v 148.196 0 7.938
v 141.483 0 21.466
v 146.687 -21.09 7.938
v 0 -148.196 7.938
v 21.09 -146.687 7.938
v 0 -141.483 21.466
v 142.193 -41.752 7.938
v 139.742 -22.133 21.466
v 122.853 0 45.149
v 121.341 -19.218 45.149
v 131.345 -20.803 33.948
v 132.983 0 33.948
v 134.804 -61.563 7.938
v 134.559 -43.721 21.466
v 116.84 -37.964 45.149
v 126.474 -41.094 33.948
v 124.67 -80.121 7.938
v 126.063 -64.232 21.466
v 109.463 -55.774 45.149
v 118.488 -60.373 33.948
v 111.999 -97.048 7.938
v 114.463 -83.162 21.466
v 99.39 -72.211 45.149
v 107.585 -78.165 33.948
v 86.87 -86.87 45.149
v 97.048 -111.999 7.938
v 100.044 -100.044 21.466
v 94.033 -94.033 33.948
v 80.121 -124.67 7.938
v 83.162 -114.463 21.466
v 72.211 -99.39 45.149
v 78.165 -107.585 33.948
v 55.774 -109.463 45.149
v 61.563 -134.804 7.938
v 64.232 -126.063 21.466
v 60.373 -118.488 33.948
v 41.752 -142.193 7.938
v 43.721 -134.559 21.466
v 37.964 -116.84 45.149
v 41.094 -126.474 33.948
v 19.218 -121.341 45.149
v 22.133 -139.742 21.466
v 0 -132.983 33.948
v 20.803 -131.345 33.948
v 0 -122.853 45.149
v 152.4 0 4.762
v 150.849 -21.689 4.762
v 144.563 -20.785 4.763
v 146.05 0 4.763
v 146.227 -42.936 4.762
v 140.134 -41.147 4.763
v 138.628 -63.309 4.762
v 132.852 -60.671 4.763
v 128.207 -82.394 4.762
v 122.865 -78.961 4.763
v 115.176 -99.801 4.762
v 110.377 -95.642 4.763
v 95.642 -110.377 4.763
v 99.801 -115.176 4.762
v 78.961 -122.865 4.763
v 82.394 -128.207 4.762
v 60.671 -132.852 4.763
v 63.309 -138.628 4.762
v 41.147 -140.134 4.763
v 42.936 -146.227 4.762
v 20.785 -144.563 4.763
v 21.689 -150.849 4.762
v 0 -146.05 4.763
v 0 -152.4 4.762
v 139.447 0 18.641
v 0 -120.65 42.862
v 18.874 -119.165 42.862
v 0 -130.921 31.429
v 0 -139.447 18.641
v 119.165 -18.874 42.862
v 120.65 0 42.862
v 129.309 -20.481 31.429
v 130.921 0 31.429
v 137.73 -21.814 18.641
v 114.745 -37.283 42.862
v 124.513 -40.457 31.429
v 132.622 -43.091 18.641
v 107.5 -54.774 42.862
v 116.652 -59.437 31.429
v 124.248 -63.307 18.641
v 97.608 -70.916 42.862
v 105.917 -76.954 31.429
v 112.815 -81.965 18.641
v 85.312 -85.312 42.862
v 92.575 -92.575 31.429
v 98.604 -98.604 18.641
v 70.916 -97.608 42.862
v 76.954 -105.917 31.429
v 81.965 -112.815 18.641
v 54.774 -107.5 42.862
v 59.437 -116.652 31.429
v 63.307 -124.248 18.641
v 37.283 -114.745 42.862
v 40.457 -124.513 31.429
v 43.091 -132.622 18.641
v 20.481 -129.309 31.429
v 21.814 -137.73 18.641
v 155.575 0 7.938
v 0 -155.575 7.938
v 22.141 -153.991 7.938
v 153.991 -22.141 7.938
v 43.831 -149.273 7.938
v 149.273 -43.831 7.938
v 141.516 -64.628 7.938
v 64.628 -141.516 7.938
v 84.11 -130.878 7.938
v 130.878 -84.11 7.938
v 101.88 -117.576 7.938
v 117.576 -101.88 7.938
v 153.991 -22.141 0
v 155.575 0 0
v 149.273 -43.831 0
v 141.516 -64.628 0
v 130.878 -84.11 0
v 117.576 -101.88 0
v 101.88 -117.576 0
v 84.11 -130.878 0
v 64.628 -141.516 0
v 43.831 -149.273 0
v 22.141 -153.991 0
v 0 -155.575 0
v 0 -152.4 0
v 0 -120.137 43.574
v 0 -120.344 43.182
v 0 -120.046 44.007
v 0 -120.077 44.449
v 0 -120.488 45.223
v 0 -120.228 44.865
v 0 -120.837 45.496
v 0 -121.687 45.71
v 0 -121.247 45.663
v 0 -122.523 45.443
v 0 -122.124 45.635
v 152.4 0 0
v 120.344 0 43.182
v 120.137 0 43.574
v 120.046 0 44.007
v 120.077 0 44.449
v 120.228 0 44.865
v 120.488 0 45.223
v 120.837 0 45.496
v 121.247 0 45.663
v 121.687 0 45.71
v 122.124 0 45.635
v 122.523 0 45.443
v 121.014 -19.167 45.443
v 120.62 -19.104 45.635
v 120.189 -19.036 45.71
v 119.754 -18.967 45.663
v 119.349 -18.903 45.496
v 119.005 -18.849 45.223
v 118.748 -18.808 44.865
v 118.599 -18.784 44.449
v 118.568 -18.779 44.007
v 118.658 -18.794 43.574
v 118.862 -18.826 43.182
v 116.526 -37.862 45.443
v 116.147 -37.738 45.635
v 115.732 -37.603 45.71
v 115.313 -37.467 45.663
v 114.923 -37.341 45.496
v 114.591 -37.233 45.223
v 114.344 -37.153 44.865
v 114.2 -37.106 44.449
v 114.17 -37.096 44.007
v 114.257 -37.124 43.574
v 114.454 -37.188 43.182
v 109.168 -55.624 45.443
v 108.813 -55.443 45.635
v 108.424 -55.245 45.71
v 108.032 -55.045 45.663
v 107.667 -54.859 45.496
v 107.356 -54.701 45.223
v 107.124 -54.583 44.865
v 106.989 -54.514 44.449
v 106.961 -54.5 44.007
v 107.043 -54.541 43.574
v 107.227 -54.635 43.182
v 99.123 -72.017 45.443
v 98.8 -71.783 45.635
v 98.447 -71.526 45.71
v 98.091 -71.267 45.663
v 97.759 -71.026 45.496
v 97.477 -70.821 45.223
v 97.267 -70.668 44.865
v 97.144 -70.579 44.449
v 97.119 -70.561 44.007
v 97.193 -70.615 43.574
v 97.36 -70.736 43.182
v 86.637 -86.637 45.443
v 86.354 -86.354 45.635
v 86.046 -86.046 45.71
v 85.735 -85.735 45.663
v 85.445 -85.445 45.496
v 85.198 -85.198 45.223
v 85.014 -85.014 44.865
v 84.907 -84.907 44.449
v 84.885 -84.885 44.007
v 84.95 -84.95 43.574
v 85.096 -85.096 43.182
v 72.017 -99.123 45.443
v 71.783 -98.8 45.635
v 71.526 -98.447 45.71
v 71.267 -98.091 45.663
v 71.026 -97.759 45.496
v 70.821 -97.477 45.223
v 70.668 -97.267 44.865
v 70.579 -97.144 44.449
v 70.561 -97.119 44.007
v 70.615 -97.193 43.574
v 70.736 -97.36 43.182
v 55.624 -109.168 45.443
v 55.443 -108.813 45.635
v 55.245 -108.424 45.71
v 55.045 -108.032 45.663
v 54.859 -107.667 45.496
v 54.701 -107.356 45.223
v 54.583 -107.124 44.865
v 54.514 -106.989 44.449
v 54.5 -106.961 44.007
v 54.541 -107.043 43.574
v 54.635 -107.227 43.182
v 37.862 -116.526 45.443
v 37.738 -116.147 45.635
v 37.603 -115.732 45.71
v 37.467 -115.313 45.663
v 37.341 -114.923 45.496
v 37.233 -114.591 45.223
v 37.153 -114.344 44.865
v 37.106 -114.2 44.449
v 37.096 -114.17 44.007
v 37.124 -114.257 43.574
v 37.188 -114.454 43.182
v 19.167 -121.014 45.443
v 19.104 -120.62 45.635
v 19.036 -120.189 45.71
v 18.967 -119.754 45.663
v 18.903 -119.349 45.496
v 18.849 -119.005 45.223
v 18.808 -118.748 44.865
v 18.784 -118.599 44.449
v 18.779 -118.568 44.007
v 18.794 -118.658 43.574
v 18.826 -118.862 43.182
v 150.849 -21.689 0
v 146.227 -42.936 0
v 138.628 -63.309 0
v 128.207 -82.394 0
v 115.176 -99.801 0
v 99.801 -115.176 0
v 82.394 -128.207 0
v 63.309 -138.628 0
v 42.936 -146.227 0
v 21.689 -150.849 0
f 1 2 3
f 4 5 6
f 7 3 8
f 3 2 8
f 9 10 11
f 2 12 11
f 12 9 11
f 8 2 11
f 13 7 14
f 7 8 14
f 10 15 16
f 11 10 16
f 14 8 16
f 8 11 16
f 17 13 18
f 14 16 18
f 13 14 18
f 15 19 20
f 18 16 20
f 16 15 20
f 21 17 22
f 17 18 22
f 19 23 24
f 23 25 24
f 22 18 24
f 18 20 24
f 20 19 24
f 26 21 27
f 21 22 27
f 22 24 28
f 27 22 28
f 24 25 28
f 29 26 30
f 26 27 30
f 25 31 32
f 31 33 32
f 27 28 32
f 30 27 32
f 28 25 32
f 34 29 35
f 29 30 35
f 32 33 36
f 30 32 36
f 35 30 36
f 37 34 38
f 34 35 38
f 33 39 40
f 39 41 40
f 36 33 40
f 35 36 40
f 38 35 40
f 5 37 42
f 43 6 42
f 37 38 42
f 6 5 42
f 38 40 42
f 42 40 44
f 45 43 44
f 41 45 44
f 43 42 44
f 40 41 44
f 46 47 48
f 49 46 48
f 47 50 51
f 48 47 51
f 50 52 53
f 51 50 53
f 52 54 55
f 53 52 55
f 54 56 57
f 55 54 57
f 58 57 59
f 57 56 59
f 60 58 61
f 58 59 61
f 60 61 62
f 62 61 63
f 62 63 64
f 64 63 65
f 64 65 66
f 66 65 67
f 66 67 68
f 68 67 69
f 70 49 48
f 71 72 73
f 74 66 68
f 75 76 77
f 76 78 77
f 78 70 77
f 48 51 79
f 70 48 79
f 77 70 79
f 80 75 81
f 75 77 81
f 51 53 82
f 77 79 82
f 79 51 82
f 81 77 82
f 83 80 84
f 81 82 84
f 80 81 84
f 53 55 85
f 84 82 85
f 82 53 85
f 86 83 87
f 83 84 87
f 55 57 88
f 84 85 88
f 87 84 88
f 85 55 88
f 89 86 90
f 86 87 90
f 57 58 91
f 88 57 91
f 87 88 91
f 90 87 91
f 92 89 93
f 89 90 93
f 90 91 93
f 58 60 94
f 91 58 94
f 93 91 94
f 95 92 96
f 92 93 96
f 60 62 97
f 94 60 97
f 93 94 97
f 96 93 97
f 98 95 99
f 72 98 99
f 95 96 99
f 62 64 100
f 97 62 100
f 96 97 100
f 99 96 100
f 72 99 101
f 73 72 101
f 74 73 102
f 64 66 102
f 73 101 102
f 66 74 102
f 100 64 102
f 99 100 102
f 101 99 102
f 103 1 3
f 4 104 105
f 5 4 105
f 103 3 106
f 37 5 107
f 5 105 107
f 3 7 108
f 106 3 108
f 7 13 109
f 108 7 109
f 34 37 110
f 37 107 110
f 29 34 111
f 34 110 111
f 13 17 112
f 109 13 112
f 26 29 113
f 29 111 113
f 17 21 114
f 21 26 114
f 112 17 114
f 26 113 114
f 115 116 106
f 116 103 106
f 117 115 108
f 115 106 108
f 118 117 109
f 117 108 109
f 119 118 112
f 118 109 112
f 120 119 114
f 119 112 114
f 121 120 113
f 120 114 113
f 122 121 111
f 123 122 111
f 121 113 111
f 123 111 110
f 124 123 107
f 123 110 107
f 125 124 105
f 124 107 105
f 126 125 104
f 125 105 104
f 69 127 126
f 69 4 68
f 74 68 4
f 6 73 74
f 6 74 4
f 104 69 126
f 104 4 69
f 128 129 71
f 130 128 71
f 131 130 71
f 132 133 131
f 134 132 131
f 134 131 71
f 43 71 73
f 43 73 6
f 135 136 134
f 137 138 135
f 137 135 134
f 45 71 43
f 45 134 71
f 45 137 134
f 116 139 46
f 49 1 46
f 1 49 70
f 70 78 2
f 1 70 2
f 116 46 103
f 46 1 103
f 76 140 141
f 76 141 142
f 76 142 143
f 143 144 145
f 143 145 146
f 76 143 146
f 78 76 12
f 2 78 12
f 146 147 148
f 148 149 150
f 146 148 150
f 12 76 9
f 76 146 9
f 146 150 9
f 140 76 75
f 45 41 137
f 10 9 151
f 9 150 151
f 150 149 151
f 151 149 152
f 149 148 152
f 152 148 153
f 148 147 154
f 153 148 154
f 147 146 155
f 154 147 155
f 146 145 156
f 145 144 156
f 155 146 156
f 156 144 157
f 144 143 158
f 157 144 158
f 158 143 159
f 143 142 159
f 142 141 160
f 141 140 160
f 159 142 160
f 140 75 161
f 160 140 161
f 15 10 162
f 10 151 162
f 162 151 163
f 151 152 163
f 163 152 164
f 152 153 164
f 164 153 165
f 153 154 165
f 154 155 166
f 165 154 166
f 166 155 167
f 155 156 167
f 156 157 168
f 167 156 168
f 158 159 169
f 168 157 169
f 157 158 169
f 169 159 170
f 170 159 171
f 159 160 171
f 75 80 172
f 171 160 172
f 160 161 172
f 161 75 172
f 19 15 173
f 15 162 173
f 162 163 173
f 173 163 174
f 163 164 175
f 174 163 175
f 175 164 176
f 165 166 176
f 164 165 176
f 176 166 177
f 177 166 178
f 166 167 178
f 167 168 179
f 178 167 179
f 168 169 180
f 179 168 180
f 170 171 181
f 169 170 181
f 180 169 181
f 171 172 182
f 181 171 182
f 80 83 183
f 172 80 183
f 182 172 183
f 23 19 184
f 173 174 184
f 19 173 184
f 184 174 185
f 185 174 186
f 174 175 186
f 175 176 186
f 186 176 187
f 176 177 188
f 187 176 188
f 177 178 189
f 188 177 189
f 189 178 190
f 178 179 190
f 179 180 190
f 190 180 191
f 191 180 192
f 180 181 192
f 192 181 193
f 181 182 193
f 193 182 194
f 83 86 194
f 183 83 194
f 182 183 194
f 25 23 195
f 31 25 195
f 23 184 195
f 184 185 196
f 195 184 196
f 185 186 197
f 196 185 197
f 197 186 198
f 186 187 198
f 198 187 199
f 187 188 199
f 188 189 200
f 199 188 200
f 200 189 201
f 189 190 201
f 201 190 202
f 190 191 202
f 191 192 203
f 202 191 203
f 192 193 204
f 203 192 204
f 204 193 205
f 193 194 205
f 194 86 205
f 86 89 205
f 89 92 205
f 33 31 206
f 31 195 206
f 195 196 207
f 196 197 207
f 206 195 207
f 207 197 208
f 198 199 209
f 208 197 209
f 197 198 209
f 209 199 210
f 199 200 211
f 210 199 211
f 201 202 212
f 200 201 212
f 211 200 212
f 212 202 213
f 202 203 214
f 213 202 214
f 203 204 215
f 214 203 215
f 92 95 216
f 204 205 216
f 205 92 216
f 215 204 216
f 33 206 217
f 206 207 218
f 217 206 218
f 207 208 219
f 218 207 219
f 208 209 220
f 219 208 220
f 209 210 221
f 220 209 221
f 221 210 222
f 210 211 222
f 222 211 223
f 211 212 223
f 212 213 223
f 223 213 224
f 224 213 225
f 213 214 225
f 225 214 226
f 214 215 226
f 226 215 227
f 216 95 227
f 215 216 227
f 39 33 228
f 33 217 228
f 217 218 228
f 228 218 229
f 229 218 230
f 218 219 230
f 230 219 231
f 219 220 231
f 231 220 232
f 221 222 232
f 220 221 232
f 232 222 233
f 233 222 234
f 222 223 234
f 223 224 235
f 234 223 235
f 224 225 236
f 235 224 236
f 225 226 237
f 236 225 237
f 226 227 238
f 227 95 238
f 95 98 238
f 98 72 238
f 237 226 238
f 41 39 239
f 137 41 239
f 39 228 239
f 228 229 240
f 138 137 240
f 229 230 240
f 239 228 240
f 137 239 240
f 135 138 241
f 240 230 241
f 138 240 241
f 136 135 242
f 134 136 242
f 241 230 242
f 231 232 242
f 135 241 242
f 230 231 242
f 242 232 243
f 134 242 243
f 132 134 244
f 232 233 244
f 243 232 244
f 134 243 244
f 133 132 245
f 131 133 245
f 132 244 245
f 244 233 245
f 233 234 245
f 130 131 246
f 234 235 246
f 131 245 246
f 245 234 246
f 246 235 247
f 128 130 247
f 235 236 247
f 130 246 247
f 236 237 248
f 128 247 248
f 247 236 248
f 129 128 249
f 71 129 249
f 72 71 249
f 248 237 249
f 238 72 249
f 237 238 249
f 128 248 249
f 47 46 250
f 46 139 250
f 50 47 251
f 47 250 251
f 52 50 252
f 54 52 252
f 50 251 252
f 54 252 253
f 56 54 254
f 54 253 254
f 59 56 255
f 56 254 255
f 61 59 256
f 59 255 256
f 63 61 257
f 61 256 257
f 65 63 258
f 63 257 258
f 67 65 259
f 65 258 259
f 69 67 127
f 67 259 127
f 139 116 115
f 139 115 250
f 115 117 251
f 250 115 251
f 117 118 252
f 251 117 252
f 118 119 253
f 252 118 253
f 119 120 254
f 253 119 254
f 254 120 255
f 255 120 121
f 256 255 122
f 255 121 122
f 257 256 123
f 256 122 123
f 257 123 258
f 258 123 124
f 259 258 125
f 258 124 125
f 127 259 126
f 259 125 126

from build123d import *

# Parameters (mm, degrees)
F1_ANGLE = 90


with BuildPart() as f1:
    # F0 (on Front) → F1 (revolve)
    with BuildSketch(Plane.XZ):
        with BuildLine():
            Line((152.4, 4.7625), (152.4, 0))
            Line((152.4, 0), (155.575, 0))
            Line((155.575, 0), (155.575, 7.9375))
            Line((155.575, 7.9375), (148.195857, 7.9375))
            ThreePointArc((148.195857, 7.9375), (137.447355, 27.85258), (122.85325, 45.148614))
            ThreePointArc((122.85325, 45.148614), (120.488449, 45.222947), (120.65, 42.8625))
            ThreePointArc((120.65, 42.8625), (135.414004, 25.188502), (146.05, 4.7625))
            Line((146.05, 4.7625), (152.4, 4.7625))
        make_face()
    revolve(axis=Axis((0, 0, 21.596912), (0, 0, -1)), revolution_arc=F1_ANGLE)


solid = f1.part
